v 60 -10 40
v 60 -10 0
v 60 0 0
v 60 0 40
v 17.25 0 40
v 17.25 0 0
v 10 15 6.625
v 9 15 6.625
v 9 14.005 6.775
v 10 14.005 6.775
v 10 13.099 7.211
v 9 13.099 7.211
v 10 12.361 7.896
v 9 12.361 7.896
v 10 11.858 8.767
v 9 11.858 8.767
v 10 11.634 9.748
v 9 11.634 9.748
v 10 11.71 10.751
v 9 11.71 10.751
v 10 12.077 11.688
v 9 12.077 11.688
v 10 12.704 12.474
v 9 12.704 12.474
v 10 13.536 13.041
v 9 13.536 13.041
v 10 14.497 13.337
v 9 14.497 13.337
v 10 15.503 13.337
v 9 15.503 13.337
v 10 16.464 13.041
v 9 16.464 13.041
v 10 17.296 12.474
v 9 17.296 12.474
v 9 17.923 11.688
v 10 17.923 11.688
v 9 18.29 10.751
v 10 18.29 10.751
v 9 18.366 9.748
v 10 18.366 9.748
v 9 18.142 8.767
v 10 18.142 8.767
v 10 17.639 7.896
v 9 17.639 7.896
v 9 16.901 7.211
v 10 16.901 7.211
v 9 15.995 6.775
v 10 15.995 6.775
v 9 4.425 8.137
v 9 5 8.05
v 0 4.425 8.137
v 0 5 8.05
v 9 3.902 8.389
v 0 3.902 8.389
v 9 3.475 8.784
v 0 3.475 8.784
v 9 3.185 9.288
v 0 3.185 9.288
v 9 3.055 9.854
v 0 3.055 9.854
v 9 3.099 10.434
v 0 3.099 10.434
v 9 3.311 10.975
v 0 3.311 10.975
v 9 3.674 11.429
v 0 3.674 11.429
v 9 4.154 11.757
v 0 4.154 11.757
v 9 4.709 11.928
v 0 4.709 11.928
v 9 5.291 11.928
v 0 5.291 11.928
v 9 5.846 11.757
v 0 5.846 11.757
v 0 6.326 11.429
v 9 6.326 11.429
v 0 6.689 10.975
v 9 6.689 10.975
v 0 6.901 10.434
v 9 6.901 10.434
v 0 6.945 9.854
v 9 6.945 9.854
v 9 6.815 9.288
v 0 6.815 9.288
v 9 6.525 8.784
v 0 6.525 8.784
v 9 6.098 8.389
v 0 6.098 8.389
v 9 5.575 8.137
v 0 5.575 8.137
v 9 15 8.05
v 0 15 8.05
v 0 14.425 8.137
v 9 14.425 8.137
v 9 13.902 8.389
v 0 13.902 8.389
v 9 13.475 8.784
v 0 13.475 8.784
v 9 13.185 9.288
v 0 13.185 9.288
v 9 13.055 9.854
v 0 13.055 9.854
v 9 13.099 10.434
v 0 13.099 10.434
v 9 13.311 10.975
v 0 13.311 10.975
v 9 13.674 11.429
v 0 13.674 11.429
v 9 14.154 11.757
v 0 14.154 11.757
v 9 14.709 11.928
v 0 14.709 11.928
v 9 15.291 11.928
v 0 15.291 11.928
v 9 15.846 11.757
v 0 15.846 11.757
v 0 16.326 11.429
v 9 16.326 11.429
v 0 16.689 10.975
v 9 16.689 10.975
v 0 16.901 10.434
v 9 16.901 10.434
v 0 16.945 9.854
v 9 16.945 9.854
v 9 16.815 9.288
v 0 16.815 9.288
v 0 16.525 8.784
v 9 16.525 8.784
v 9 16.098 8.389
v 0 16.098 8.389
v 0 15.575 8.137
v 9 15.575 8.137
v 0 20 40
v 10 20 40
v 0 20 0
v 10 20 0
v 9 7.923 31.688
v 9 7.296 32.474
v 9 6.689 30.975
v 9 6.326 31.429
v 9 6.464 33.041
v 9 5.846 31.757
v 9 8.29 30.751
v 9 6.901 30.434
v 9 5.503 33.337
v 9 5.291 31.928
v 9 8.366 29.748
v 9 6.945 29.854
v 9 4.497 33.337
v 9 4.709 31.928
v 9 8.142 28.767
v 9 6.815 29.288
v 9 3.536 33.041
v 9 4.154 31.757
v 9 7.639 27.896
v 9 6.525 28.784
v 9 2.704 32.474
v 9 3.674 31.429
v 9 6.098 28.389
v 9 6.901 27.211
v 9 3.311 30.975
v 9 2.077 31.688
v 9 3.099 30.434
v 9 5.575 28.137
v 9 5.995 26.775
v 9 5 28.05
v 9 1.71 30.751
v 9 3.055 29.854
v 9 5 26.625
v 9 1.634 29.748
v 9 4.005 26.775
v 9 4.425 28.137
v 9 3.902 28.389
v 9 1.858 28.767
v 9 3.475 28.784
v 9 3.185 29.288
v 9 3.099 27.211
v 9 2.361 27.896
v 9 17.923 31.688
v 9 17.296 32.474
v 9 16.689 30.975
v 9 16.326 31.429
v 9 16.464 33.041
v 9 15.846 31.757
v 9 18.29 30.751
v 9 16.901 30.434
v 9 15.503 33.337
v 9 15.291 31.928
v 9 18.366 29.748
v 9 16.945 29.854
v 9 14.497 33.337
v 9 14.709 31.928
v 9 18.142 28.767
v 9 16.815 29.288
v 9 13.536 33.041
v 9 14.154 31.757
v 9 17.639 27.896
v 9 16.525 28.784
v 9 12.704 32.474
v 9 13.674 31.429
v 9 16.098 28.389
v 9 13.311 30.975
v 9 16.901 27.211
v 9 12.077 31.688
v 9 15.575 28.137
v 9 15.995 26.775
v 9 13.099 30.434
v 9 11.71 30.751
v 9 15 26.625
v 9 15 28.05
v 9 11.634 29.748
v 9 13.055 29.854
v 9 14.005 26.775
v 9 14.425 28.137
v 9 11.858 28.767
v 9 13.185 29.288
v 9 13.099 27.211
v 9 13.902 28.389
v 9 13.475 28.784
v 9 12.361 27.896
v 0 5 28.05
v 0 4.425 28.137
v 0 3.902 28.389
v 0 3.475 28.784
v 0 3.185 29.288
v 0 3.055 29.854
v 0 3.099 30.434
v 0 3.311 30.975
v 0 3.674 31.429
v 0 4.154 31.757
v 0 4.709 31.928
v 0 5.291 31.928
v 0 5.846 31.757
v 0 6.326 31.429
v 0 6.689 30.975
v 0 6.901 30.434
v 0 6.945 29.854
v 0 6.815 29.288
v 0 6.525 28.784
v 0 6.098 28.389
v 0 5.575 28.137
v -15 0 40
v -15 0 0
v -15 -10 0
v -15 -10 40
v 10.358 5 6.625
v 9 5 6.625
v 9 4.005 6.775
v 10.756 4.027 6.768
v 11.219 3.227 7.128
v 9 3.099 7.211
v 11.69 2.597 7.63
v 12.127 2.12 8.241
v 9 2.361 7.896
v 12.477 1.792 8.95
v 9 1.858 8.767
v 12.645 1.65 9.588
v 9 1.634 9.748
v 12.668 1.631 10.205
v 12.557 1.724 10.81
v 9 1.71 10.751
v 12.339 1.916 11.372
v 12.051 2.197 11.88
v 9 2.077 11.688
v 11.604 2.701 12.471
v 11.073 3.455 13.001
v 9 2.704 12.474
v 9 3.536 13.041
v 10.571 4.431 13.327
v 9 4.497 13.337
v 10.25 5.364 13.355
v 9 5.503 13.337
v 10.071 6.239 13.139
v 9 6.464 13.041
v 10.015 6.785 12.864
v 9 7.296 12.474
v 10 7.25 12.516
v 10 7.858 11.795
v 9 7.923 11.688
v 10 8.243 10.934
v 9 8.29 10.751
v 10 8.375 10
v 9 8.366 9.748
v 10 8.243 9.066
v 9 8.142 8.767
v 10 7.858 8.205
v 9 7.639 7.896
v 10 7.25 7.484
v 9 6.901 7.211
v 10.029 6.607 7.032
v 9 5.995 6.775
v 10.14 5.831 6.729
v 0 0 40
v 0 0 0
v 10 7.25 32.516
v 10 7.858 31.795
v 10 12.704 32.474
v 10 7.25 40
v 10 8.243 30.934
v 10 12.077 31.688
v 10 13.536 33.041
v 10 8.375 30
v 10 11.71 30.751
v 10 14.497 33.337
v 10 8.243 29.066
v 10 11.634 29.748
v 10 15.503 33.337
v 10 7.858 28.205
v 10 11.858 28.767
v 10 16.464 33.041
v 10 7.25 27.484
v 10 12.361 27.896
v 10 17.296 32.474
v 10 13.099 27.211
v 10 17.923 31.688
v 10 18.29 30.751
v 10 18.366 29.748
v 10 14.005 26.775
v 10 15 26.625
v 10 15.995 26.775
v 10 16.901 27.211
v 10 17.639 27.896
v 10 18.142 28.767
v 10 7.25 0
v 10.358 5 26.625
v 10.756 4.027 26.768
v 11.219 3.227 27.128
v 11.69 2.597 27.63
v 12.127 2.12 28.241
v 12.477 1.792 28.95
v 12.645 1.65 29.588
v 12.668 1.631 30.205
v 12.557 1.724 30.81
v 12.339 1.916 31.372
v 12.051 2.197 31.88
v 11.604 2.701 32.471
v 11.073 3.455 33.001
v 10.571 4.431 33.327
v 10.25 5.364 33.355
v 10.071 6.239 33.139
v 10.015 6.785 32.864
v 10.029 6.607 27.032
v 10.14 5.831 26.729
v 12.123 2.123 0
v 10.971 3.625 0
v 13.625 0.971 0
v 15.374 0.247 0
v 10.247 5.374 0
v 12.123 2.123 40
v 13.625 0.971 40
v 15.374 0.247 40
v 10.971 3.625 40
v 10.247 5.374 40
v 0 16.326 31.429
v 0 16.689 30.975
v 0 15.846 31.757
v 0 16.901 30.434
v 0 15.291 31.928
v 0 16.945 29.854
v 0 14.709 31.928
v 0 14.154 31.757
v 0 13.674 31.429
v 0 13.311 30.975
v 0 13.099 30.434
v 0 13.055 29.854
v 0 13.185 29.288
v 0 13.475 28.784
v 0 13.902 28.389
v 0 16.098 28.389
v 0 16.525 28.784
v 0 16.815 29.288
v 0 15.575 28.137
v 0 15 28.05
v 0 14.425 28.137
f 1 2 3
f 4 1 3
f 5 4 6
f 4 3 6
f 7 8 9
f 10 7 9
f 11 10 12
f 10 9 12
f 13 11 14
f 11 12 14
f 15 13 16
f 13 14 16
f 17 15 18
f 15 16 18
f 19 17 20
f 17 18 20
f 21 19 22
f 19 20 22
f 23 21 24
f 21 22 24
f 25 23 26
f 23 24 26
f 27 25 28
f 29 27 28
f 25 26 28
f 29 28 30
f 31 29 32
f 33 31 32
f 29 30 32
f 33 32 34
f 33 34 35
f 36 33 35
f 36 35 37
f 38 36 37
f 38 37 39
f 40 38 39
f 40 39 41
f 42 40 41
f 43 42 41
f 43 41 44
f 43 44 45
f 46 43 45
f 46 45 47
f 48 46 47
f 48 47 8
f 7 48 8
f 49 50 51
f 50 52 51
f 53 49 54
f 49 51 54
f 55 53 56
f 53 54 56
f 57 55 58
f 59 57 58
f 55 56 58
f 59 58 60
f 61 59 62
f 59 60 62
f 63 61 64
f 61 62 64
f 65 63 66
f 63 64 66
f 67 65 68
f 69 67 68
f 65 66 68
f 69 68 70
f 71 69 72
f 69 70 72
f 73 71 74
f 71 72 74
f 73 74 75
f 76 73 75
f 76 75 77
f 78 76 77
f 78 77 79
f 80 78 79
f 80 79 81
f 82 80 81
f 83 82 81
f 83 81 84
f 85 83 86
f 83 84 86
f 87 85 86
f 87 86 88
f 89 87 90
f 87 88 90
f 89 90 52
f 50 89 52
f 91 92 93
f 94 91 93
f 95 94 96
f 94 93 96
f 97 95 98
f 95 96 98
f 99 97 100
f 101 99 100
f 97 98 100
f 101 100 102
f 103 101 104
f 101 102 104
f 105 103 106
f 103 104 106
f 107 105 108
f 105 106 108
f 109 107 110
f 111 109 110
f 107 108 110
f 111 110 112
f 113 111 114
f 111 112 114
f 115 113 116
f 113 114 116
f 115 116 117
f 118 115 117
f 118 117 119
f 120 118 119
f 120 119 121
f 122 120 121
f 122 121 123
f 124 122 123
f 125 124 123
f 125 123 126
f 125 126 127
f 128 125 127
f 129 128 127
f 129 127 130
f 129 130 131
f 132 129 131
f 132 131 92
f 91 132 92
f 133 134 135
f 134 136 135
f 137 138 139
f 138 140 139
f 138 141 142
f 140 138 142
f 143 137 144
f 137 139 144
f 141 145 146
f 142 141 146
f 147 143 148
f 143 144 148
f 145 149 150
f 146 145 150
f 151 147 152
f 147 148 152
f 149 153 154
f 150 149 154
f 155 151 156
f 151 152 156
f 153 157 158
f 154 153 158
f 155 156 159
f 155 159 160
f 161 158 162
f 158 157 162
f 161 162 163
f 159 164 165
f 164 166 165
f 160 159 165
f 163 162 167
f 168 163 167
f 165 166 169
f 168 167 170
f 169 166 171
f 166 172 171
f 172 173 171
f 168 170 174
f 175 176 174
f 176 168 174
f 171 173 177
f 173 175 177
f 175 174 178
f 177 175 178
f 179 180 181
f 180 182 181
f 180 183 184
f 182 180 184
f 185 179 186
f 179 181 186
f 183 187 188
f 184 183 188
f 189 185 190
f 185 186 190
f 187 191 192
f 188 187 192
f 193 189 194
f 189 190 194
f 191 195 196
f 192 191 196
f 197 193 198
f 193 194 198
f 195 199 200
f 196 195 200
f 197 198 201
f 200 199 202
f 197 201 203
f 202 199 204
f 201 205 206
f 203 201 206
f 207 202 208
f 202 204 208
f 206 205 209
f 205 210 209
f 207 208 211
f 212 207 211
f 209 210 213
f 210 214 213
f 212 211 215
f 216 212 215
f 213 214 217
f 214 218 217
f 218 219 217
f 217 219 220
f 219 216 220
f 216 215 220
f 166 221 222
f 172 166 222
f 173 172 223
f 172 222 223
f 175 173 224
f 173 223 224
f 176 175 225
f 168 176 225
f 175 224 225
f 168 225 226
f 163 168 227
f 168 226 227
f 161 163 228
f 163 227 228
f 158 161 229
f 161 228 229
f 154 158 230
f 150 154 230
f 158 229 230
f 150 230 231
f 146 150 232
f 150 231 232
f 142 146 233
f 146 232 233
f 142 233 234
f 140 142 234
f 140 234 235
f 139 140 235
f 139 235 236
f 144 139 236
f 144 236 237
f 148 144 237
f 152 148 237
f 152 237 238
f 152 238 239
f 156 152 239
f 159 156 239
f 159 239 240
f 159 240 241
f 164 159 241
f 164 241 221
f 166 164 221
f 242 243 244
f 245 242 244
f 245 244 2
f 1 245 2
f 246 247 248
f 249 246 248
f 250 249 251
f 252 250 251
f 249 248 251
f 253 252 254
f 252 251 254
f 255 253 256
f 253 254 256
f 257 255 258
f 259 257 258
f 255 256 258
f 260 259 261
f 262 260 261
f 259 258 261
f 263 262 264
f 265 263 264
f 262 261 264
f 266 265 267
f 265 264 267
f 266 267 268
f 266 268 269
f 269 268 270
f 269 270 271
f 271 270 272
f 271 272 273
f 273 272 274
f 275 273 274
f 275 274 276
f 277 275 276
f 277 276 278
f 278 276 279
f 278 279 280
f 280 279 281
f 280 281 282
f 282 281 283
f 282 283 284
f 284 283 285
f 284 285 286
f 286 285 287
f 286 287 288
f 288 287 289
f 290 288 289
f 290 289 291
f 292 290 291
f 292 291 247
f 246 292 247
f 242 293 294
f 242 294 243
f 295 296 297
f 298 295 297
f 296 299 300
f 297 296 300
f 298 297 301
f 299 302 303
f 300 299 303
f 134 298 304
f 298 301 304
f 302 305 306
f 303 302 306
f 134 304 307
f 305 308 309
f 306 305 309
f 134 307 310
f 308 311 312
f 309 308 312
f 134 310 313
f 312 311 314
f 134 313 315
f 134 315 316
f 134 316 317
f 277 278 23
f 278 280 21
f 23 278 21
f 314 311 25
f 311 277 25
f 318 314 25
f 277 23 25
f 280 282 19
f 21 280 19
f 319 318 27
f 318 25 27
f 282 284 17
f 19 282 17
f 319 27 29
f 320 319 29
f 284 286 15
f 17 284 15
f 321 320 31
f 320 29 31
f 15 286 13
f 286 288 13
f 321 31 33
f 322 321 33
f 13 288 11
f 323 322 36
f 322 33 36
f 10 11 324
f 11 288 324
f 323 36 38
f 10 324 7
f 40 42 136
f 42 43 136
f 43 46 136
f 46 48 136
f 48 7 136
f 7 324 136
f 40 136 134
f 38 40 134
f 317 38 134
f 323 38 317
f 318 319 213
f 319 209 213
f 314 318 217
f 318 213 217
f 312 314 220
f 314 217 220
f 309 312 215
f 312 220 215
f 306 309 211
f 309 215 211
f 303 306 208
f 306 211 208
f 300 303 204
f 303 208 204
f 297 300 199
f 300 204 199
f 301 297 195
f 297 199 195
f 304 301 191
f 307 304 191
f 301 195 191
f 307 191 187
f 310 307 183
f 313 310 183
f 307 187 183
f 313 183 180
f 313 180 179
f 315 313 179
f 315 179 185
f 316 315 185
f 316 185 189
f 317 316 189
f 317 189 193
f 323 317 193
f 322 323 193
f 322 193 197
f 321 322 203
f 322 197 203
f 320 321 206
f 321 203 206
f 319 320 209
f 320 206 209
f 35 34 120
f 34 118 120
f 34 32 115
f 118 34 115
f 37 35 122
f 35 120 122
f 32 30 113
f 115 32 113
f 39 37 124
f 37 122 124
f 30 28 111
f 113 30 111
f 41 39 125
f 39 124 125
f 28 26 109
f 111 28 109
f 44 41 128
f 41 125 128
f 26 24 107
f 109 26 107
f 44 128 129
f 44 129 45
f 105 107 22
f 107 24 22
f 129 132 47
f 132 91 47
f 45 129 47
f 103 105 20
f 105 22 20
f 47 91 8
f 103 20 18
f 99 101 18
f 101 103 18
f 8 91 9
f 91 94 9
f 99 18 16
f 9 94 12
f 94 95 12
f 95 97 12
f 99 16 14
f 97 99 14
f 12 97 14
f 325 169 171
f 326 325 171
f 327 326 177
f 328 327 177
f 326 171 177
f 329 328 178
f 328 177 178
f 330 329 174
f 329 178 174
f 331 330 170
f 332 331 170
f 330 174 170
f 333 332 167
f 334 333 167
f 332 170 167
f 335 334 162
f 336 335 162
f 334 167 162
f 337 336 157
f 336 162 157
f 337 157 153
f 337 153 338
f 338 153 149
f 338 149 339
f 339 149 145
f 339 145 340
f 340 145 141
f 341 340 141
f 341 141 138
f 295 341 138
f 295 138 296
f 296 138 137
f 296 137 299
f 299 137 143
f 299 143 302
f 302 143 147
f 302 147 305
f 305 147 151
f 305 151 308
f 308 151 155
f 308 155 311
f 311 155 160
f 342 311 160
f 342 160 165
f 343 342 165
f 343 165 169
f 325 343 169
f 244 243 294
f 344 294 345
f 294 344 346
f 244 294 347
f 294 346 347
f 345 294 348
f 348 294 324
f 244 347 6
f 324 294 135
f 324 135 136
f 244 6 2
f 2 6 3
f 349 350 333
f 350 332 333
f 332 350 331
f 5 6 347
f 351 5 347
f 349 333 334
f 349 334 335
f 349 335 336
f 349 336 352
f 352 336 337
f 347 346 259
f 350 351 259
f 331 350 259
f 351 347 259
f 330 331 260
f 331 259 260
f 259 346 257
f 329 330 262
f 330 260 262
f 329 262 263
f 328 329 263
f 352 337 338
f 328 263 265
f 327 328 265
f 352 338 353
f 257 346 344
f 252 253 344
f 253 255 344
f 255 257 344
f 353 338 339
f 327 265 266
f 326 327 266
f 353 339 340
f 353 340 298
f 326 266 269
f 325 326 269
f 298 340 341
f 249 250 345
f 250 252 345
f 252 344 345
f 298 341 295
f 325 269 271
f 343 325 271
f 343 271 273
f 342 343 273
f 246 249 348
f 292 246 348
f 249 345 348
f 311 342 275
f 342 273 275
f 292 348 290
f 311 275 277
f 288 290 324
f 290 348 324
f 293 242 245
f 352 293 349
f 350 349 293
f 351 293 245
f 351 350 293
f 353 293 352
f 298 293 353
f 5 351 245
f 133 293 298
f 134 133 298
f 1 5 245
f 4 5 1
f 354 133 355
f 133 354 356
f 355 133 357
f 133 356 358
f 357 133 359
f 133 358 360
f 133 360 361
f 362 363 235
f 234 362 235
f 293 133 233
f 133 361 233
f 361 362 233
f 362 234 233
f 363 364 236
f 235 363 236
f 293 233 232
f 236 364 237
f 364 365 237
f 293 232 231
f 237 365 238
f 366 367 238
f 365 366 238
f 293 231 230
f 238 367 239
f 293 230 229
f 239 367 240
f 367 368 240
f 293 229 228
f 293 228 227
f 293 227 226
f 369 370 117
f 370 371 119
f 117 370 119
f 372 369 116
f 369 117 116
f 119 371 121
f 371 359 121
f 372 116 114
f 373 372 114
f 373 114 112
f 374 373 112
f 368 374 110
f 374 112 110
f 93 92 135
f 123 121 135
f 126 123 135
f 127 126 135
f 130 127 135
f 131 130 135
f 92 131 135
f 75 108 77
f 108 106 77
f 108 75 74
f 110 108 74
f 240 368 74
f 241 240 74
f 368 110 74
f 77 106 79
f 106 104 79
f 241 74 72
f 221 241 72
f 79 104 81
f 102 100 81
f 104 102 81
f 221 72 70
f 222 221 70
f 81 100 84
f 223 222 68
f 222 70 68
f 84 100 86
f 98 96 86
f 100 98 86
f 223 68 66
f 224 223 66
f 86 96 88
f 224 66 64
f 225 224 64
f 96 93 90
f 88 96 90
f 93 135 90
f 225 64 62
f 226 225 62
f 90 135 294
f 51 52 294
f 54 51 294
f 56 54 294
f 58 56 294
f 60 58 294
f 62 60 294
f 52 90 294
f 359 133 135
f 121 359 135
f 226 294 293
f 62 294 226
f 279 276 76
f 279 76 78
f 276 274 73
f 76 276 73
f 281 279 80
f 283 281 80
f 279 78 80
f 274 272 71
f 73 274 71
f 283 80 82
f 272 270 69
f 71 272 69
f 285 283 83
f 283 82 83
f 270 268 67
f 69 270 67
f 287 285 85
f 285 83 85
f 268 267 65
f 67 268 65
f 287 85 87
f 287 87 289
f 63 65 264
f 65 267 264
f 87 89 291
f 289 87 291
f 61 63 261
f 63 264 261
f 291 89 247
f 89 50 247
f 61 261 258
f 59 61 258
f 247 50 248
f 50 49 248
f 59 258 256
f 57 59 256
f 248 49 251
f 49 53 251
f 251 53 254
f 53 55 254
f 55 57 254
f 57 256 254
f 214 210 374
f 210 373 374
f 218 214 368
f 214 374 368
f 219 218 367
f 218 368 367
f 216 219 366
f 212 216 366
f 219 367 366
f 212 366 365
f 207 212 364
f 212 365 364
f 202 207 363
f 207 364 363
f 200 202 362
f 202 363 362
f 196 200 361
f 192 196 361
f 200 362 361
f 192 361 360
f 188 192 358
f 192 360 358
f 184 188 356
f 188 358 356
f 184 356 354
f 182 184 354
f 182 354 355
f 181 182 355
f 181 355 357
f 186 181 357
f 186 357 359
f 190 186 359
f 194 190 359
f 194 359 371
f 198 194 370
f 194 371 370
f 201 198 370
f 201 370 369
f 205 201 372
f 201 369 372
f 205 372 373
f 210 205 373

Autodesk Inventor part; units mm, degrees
ref_plane "YZ Plane" through (0, 0, 0) normal (1, 0, 0) x (0, 1, 0)
ref_plane "XZ Plane" through (0, 0, 0) normal (0, 1, 0) x (-1, 0, 0)
ref_plane "XY Plane" through (0, 0, 0) normal (0, 0, 1) x (1, 0, 0)
sketch "Sketch1" plane through (0, 0, 0) normal (0, 0, 1) x (1, 0, 0)
  line L0 (0, 0) -> (10, 0)
  line L1 (10, 0) -> (10, 20)
  line L2 (10, 20) -> (0, 20)
  line L3 (0, 20) -> (0, 0)
  line L4 (10, 0) -> (-15, 0)
  line L5 (-15, 0) -> (-15, -10)
  line L6 (-15, -10) -> (10, -10)
  line L7 (10, -10) -> (10, 0)
  line L8 (10, -10) -> (60, -10)
  line L9 (60, -10) -> (60, 0)
  line L10 (60, 0) -> (10, 0)
  line L11 (10, 0) -> (10, -10)
  dimension "d0" = 10
  dimension "d1" = 20
  dimension "d2" = 25
  dimension "d3" = 10
  dimension "d4" = 50
extrude "Extrusion1" add sketch "Sketch1" along normal blind 40
sketch "Sketch2" plane through (10, 20, 40) normal (1, 0, 0) x (0, 0, -1)
  line L0 (40, 0) -> (0, 0) construction
  line L1 (40, -20) -> (0, -20) construction
  line L2 (0, -20) -> (0, 0) construction
  line L3 (0, 0) -> (40, 0) construction
  line L4 (40, 0) -> (40, -20) construction
  line L5 (40, 0) -> (40, -20) construction
  line L6 (0, 0) -> (40, -20) construction
  line L7 (0, 0) -> (0, -20) construction
  line L8 (40, 0) -> (0, -20) construction
  line L9 (10, -15) -> (30, -15) construction
  line L10 (30, -15) -> (30, -5) construction
  line L11 (30, -5) -> (10, -5) construction
  line L12 (10, -5) -> (10, -15) construction
  line L13 (10, -15) -> (30, -5) construction
  line L14 (30, -15) -> (10, -5) construction
  point P0 (20, -10)
  dimension "d9" = 20
hole "Hole1" at (10, 15, 30) at (10, 15, 10) at (10, 5, 10) at (10, 5, 30) direction (-1, 0, 0) diameter 3.9 end through all counterbore diameter 6.75 counterbore depth 1
fillet "Fillet3" radius 7.25 1 edges at (10, 0, 20)
properties part number "Test Stand"
